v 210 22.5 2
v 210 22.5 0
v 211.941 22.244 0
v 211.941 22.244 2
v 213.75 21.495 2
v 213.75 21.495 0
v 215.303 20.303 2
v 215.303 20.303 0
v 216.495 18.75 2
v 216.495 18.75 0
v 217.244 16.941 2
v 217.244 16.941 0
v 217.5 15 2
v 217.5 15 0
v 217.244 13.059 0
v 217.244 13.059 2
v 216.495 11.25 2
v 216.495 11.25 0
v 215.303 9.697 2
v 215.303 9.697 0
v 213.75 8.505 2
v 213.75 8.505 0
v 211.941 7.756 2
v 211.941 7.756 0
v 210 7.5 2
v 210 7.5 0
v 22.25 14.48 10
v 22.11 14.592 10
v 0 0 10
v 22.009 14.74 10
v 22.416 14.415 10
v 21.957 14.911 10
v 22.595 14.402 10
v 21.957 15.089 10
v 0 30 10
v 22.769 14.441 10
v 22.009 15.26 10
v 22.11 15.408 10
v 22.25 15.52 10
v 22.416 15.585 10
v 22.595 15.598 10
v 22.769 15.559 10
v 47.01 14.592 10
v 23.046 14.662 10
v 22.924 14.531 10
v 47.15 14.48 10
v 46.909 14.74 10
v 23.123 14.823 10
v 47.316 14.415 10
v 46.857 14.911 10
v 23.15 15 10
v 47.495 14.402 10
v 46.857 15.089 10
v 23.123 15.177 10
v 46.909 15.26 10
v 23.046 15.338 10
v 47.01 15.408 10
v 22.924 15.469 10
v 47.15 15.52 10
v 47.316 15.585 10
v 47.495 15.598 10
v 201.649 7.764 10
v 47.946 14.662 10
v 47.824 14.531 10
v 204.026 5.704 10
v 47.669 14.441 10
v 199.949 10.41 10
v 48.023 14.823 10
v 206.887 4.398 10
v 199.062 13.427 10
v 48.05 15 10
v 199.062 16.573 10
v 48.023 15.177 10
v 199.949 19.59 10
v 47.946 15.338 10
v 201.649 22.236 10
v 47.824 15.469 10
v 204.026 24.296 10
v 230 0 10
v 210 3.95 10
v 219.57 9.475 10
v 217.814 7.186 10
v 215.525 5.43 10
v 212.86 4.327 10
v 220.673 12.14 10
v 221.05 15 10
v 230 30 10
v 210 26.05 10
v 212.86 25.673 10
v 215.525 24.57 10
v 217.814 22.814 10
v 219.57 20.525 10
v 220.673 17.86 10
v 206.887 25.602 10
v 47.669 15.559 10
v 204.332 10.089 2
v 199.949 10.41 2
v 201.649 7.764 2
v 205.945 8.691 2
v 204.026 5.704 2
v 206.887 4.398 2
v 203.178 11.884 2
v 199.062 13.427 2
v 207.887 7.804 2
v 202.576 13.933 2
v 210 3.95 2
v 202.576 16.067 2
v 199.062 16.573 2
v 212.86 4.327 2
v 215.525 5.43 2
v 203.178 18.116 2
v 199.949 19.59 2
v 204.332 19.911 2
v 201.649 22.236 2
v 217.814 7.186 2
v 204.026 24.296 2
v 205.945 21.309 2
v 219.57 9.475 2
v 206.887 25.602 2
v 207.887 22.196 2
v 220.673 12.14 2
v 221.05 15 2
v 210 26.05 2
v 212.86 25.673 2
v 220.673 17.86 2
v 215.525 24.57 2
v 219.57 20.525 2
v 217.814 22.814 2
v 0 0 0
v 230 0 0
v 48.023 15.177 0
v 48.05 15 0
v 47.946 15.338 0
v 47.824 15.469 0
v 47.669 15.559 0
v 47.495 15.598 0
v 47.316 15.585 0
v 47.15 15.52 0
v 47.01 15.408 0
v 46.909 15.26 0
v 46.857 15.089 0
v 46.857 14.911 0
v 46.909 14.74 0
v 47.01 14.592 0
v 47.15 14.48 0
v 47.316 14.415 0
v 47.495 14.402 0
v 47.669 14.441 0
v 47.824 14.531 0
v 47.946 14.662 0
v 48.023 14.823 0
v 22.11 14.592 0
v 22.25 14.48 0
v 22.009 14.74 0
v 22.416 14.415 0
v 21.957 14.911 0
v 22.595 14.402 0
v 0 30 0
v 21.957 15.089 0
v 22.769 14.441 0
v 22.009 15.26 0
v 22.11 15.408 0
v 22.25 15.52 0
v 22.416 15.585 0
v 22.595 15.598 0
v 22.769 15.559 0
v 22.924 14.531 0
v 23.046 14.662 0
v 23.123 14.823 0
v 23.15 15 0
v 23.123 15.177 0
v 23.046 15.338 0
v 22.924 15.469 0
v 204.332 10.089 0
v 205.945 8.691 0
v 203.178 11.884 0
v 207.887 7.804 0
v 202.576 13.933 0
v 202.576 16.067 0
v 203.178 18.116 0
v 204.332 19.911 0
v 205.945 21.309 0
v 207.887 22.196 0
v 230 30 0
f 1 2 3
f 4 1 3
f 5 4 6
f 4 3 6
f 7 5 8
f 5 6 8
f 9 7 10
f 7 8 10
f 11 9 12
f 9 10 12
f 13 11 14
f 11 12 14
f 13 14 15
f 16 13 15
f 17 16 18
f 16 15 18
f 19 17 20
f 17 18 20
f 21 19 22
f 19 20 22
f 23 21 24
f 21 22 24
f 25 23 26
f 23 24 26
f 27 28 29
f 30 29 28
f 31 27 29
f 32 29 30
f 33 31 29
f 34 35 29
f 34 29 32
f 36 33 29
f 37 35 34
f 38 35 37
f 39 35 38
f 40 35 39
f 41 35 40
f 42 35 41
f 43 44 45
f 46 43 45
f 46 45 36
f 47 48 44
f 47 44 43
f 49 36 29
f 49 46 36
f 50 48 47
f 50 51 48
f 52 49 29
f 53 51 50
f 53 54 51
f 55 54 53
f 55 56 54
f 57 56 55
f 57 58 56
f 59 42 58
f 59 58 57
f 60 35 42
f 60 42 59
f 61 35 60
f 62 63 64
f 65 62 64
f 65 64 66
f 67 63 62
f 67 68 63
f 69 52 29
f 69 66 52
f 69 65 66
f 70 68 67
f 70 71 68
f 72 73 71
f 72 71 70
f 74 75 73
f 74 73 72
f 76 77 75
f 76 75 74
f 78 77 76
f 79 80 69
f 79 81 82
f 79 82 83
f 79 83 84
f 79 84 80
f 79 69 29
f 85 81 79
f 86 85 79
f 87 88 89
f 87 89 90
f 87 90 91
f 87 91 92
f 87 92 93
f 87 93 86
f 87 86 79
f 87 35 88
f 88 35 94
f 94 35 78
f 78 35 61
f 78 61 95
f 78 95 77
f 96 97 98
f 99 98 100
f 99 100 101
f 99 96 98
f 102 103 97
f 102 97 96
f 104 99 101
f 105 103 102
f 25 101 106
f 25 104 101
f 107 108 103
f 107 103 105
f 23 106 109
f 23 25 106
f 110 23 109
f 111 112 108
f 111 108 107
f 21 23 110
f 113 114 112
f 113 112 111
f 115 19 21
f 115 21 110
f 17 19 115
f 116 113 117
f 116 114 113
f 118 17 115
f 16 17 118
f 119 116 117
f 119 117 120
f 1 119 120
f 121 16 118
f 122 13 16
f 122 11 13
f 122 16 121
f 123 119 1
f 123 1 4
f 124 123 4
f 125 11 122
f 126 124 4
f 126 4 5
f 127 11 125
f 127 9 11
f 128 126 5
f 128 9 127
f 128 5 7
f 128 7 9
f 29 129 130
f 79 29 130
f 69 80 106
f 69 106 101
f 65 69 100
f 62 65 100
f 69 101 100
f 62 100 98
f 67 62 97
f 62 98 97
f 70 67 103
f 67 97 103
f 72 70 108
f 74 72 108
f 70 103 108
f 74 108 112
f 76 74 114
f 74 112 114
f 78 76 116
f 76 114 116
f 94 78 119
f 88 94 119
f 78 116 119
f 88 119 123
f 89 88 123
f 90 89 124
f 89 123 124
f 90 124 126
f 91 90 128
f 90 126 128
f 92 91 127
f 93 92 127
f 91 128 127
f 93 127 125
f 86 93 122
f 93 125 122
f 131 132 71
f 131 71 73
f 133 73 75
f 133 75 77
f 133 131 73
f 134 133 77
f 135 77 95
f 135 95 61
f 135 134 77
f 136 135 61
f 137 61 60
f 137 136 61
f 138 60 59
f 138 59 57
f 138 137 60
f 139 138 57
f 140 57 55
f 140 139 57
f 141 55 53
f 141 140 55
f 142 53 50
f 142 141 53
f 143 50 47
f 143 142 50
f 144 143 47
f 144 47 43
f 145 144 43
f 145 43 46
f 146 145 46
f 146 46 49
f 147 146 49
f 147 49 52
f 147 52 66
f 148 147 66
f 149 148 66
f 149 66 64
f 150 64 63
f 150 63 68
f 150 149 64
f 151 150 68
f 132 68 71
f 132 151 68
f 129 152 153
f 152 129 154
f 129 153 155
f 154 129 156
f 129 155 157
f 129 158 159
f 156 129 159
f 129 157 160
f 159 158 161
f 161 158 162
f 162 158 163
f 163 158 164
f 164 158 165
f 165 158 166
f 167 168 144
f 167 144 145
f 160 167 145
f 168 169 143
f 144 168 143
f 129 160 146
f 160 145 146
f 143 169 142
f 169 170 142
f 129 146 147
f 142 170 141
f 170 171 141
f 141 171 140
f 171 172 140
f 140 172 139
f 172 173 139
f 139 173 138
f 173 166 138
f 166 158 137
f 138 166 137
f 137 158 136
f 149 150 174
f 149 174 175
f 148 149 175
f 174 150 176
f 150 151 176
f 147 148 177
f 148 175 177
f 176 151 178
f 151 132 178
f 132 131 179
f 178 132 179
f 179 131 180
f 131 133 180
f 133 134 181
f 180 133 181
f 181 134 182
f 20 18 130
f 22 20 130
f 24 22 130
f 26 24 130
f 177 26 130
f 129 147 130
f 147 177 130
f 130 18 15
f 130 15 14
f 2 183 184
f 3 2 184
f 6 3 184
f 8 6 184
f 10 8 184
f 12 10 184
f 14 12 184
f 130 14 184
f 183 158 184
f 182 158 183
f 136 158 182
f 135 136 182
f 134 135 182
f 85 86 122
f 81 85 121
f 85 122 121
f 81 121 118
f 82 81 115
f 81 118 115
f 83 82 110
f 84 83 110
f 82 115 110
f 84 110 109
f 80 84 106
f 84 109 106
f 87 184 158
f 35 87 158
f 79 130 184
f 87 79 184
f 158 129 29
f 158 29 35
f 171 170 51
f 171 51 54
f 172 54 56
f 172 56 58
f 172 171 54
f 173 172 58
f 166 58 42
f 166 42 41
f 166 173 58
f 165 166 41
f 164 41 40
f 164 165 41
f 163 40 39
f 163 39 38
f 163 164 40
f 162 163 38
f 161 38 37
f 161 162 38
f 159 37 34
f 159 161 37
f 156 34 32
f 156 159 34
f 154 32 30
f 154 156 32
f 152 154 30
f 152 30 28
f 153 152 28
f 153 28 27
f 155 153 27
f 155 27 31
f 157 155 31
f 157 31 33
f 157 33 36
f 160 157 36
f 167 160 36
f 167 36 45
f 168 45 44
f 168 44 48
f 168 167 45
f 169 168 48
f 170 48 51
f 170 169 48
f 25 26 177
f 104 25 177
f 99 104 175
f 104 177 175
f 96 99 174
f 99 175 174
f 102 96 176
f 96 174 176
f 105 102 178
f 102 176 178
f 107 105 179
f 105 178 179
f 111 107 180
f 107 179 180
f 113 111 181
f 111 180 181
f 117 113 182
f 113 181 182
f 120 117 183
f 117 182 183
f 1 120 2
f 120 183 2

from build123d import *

# Parameters (mm, degrees)
SKETCH1_W           = 230
SKETCH1_H           = 30
SKETCH1_R           = 0.6
SKETCH1_R_2         = 11.05
BOSS_EXTRUDE2_DEPTH = 10
SKETCH1_6_R         = 11.05
SKETCH1_6_R_2       = 7.5
BOSS_EXTRUDE3_DEPTH = 2


with BuildPart() as part:
    # Sketch1 → Boss-Extrude2 (new body)
    with BuildSketch(Plane.XY):
        with Locations((115, 15)):
            Rectangle(SKETCH1_W, SKETCH1_H)
        with Locations((22.55, 15)):
            Circle(SKETCH1_R, mode=Mode.SUBTRACT)
        with Locations((47.45, 15)):
            Circle(SKETCH1_R, mode=Mode.SUBTRACT)
        with Locations((210, 15)):
            Circle(SKETCH1_R_2, mode=Mode.SUBTRACT)
    extrude(amount=BOSS_EXTRUDE2_DEPTH)

    # Sketch1<6> → Boss-Extrude3 (add)
    with BuildSketch(Plane.XY):
        with Locations((210, 15)):
            Circle(SKETCH1_6_R)
        with Locations((210, 15)):
            Circle(SKETCH1_6_R_2, mode=Mode.SUBTRACT)
    extrude(amount=BOSS_EXTRUDE3_DEPTH)


solid = part.part
